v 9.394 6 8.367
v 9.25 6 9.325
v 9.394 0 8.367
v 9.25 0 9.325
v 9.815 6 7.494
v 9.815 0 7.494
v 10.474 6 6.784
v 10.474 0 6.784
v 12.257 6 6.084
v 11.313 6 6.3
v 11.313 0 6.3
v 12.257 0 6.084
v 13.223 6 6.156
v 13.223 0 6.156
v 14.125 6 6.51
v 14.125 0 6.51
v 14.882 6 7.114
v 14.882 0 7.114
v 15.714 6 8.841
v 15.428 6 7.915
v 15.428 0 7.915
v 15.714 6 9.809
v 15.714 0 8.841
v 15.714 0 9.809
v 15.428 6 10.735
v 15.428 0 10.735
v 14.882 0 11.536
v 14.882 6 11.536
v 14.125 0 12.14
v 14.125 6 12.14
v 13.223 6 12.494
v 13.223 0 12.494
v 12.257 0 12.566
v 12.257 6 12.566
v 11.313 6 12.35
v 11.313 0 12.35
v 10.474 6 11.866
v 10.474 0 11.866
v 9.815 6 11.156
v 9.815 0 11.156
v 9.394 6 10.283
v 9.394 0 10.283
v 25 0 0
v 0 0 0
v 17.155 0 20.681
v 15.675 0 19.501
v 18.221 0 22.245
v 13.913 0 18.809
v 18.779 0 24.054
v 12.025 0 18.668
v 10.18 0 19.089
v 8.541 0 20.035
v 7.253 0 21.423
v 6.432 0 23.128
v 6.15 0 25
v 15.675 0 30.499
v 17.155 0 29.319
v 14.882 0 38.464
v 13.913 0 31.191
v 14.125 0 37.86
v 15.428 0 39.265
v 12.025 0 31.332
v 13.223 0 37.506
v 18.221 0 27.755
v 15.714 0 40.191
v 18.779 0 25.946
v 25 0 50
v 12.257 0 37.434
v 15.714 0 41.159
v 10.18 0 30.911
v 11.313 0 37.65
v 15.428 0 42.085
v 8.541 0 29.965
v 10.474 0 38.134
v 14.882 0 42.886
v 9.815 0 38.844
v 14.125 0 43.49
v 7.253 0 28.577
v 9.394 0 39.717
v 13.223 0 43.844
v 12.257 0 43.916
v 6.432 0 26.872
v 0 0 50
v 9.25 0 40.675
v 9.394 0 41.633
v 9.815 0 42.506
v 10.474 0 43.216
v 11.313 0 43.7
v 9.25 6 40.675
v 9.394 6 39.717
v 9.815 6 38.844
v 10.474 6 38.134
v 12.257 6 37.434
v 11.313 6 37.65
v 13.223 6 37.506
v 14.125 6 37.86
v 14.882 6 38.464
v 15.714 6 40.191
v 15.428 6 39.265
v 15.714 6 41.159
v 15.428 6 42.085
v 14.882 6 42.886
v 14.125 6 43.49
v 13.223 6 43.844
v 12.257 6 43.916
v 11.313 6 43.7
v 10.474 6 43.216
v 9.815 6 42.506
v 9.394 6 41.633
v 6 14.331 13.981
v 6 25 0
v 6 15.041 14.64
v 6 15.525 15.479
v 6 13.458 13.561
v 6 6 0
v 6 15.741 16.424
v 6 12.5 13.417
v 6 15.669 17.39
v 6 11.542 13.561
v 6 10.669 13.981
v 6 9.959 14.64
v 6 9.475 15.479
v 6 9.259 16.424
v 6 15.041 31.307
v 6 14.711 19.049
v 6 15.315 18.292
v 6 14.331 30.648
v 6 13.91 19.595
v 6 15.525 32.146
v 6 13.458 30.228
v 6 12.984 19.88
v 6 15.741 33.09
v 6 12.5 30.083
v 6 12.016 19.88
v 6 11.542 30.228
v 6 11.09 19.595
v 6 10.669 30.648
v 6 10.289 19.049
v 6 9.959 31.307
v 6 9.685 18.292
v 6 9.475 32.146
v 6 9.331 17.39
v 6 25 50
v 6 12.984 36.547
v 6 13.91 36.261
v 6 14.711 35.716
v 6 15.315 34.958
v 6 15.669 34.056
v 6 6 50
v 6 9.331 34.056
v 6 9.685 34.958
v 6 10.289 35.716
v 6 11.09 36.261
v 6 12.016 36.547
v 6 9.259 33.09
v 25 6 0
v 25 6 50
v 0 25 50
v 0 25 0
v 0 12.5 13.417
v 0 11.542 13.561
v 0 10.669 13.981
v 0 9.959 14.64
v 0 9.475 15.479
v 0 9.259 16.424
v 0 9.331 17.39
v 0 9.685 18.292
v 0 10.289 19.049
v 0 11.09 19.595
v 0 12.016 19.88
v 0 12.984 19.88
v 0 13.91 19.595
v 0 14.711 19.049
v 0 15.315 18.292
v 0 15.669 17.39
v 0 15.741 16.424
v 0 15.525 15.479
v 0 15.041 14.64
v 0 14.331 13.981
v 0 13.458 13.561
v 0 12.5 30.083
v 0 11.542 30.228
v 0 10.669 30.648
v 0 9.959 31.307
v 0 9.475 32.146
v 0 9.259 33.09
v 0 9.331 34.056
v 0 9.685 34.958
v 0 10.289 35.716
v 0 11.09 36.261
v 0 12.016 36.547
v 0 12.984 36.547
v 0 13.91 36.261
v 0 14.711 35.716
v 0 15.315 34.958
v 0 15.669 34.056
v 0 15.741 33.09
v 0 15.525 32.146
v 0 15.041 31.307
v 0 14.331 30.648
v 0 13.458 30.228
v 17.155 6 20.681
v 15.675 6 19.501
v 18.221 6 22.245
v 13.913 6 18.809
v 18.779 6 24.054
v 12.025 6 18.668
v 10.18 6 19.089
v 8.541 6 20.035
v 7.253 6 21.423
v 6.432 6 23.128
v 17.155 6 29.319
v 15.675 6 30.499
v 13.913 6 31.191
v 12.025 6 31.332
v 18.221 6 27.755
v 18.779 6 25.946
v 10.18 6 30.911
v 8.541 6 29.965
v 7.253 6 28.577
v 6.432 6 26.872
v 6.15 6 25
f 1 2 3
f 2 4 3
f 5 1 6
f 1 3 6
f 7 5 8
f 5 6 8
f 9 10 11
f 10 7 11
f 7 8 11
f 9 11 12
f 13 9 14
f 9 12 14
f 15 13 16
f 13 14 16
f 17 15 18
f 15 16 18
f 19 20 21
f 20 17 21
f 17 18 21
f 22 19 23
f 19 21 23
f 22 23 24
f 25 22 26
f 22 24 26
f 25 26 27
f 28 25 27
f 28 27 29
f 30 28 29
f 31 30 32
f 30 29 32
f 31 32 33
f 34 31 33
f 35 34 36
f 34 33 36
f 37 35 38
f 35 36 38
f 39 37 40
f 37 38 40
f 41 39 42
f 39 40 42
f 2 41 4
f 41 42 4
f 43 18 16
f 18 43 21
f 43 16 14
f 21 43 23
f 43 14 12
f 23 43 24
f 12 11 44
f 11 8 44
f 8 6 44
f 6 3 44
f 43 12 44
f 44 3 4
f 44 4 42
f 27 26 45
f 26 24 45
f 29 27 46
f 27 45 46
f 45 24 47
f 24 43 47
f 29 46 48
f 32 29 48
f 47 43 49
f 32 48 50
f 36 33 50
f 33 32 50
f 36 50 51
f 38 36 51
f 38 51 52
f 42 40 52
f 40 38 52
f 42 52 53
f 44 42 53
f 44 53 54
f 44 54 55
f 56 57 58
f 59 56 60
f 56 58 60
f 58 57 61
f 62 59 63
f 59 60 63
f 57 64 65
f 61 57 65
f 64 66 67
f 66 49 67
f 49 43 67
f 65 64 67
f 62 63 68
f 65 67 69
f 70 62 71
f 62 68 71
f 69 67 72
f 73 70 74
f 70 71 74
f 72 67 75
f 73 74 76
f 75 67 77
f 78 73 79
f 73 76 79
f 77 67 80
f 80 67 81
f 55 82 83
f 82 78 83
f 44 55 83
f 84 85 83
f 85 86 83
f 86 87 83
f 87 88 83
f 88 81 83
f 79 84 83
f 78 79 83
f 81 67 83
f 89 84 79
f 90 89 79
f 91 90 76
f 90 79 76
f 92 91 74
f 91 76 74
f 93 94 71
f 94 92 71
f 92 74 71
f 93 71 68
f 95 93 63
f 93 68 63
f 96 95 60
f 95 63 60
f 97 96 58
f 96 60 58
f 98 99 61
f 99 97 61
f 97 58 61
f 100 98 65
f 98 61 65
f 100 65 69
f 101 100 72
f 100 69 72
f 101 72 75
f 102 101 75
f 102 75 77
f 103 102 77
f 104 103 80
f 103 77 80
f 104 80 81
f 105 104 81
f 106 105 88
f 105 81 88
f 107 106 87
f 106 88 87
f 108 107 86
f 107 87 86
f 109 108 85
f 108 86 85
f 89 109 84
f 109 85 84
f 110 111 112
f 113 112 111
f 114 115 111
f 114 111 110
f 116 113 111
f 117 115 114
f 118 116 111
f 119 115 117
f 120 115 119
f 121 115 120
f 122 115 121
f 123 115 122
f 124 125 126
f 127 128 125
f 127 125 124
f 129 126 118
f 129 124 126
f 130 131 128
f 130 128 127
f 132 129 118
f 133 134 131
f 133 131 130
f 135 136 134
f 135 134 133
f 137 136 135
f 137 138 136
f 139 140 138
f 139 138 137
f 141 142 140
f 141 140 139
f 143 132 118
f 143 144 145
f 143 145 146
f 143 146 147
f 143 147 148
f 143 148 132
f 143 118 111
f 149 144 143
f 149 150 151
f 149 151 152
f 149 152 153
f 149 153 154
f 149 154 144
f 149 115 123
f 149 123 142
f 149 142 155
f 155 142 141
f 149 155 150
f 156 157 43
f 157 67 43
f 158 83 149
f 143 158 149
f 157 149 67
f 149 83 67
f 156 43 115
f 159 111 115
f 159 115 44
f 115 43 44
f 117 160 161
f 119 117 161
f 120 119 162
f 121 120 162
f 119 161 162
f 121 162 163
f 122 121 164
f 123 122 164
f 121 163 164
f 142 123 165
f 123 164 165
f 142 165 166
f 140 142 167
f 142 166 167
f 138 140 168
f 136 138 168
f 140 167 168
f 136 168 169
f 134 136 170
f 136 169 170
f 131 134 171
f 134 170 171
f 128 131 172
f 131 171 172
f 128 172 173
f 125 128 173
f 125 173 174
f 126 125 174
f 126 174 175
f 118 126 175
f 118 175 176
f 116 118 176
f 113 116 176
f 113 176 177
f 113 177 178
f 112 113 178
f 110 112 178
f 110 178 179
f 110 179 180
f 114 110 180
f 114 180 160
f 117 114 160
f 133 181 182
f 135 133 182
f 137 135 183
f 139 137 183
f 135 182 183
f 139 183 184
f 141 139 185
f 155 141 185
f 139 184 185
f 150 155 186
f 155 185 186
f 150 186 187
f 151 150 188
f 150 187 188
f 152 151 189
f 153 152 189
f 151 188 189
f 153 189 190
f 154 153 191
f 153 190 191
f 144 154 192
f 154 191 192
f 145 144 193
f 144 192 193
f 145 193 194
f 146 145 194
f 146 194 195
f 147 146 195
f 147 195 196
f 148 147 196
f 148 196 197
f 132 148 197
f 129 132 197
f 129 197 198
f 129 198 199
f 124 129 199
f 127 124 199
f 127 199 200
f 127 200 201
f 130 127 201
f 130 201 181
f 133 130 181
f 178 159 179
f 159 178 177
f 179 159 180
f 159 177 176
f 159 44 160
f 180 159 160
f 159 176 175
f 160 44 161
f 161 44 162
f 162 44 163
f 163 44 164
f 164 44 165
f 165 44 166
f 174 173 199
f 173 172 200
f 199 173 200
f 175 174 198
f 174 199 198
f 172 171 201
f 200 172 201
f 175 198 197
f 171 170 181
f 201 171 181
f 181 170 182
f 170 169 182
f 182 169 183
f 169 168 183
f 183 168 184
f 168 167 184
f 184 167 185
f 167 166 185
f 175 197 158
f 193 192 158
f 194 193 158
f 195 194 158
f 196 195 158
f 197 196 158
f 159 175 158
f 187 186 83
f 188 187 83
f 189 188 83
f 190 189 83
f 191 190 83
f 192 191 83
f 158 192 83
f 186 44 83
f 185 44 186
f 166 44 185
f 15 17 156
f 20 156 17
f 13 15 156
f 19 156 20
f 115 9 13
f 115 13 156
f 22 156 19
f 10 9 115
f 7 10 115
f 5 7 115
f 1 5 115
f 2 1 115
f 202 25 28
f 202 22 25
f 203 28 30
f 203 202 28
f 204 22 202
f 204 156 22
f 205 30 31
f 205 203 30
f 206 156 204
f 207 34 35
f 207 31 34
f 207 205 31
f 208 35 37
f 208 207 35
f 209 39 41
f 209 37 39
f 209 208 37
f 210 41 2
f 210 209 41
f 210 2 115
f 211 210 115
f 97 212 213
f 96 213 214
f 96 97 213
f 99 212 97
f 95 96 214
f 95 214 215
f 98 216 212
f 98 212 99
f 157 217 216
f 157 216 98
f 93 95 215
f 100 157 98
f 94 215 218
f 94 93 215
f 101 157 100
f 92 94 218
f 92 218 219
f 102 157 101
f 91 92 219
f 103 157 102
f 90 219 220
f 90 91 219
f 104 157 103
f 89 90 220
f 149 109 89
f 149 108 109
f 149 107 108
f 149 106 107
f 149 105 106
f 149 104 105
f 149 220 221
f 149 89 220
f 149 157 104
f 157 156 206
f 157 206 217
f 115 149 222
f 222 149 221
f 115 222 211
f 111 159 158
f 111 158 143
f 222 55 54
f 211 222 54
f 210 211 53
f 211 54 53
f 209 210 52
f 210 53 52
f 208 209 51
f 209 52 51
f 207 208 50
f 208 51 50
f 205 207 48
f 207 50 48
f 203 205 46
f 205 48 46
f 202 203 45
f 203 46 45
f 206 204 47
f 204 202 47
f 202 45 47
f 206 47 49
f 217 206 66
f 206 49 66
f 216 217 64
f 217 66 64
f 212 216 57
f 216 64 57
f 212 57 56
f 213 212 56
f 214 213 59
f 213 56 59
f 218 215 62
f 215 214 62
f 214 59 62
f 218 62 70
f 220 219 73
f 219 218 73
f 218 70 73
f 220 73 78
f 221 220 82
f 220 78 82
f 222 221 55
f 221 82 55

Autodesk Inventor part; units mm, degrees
ref_plane "YZ Plane" through (0, 0, 0) normal (1, 0, 0) x (0, 1, 0)
ref_plane "XZ Plane" through (0, 0, 0) normal (0, 1, 0) x (-1, 0, 0)
ref_plane "XY Plane" through (0, 0, 0) normal (0, 0, 1) x (1, 0, 0)
sketch "Sketch1" plane through (0, 0, 0) normal (0, 1, 0) x (-1, 0, 0)
  line L0 (0, 0) -> (0, 50)
  line L1 (0, 50) -> (-25, 50)
  line L2 (-25, 50) -> (-25, 0)
  line L3 (-25, 0) -> (0, 0)
  circle A0 centre (-12.5, 25) radius 6.35
  circle A1 centre (-12.5, 40.675) radius 3.25
  circle A2 centre (-12.5, 9.325) radius 3.25
  dimension "d0" = 50
  dimension "d1" = 25
  dimension "d2" = 12.7
  dimension "d3" = 6.5
  dimension "d4" = 6.5
extrude "Extrusion1" add sketch "Sketch1" along normal blind 6
sketch "Sketch2" plane through (0, 6, 0) normal (0, 1, 0) x (1, 0, 0)
  line L0 (25, 0) -> (0, 0) projected
  line L1 (0, 0) -> (6, 0)
  line L2 (6, 0) -> (6, -50)
  line L3 (0, -50) -> (25, -50) projected
  line L4 (0, 0) -> (0, -50) projected
  line L5 (0, -50) -> (0, 0)
  dimension "d7" = 6
extrude "Extrusion2" add sketch "Sketch2" along normal blind 19
sketch "Sketch3" plane through (6, 6, 50) normal (1, 0, 0) x (0, 0, -1)
  circle A0 centre (16.6667, 6.5) radius 3.25
  circle A1 centre (33.3333, 6.5) radius 3.25
  point P0 (50, -6)
  dimension "d10" = 6.5
  dimension "d11" = 6.5
hole "Hole1" at (6, 12.5, 33.3333) at (6, 12.5, 16.6667) direction (-1, 0, 0) diameter 6.5 depth 111
properties part number "Roter_shaft_support_base"
